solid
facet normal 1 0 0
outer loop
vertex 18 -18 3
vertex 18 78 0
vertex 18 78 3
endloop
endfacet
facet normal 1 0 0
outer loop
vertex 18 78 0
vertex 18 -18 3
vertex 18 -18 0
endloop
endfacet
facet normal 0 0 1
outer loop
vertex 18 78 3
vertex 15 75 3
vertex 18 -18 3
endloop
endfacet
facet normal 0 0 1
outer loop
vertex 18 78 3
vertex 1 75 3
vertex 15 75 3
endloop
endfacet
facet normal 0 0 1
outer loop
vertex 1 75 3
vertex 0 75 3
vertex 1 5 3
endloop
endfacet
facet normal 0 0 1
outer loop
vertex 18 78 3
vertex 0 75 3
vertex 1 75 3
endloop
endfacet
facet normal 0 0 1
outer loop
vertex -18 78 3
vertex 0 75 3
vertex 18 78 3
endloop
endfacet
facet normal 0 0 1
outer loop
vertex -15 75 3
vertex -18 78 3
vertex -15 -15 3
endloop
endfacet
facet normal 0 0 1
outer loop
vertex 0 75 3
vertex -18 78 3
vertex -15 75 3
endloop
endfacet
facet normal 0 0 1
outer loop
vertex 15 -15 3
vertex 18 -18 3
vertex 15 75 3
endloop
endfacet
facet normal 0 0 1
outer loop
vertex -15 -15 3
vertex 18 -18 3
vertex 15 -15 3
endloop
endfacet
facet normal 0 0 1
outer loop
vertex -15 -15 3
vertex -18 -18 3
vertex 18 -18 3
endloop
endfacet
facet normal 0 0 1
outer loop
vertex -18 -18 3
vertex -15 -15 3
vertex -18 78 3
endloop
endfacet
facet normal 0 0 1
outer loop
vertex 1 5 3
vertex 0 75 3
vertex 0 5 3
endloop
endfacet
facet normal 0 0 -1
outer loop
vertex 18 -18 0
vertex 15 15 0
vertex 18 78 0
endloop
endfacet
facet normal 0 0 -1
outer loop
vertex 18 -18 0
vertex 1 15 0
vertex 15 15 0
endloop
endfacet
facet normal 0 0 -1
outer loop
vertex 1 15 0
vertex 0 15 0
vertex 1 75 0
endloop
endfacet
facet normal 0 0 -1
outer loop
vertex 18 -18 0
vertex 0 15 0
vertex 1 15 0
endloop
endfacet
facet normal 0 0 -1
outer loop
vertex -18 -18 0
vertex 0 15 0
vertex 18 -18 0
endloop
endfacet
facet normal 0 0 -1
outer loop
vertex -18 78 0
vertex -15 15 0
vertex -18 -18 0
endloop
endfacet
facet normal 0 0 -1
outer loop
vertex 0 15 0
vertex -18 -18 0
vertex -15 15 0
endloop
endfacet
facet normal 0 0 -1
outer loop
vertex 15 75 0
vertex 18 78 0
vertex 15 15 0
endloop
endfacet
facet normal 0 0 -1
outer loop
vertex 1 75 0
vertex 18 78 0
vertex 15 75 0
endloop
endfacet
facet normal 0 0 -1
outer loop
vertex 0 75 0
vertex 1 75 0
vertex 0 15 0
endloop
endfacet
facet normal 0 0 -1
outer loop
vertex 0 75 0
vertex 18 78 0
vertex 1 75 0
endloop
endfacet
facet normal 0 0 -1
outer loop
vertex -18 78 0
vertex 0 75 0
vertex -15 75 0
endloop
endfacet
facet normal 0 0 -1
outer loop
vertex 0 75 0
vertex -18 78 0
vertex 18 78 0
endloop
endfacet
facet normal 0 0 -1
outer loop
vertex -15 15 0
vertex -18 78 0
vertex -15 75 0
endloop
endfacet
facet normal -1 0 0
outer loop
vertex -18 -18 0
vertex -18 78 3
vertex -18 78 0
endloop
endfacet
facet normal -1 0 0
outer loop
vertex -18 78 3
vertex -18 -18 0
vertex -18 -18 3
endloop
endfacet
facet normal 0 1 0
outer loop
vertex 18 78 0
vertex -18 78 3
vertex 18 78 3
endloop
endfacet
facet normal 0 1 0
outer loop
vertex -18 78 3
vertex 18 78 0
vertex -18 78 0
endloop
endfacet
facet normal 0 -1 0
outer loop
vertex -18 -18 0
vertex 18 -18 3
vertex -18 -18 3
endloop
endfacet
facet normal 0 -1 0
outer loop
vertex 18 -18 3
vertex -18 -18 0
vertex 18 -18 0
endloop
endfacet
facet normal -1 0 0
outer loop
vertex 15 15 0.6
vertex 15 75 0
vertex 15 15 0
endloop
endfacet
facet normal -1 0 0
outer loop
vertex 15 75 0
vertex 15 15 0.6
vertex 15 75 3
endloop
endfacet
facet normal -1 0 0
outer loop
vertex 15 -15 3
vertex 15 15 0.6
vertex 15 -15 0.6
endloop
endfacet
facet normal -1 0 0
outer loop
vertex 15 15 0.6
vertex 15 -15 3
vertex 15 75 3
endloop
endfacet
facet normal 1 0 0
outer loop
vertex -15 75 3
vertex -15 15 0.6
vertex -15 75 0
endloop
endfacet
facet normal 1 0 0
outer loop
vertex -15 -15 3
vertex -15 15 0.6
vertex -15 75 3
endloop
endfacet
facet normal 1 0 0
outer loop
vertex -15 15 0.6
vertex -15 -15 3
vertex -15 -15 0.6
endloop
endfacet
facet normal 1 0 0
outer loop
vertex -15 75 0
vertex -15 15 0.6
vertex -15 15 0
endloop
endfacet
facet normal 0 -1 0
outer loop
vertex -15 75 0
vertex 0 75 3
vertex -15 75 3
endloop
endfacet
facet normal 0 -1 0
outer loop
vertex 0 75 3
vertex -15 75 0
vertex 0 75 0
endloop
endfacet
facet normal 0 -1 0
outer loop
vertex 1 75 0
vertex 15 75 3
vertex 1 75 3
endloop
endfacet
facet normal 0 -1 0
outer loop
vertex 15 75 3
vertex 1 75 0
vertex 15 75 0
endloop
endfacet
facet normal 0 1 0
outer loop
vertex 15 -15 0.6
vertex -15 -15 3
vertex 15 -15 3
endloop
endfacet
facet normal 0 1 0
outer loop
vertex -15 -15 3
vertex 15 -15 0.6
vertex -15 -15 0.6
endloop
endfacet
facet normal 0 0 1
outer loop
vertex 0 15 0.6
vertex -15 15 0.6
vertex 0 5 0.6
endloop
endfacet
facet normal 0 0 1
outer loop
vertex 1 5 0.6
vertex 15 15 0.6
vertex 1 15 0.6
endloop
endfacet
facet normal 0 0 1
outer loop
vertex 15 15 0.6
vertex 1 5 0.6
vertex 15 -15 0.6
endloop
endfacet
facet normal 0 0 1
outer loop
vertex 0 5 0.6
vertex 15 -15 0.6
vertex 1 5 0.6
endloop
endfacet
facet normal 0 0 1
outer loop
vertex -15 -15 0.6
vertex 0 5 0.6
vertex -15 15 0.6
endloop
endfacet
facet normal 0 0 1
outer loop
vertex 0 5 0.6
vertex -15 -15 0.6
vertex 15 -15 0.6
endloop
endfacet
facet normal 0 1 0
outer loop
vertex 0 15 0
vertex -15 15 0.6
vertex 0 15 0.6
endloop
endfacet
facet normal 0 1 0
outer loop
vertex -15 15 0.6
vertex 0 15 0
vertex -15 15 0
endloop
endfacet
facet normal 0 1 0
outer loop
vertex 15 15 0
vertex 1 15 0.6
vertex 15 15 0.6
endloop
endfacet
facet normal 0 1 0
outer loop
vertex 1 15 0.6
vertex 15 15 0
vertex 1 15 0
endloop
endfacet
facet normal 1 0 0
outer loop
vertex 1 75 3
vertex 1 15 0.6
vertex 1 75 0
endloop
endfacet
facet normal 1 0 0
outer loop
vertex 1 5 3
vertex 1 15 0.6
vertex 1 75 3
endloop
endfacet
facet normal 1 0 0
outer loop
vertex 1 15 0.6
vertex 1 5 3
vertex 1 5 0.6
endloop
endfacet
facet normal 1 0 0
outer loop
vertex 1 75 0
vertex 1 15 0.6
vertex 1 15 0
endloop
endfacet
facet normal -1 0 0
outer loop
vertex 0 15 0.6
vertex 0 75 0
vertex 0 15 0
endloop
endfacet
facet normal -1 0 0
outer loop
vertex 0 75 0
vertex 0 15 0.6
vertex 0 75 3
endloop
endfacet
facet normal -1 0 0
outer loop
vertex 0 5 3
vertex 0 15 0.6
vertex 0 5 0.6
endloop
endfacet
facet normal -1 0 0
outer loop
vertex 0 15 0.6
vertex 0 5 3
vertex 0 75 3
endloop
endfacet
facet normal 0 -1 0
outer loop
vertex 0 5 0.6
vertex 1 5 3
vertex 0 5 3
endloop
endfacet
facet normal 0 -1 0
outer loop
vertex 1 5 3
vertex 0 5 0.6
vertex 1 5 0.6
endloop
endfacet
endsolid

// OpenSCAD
line_length = 60;
line_join = 10;
line_z = 2;

diaphragm_x = 30;
diaphragm_y = 30;
diaphragm_z = 0.6;

scaffold_xy = 3; // width of outer scaffold
scaffold_z = 3; // height of outer scaffold

render_eps = 0.01;

// diaphragm
translate([0, 0, diaphragm_z/2])
cube([diaphragm_x, diaphragm_y, diaphragm_z], center=true);

translate([0, line_length/2, scaffold_z/2]){
difference(){
    cube([diaphragm_x + 2 * scaffold_xy, diaphragm_y + line_length + 2 * scaffold_xy, scaffold_z], center=true);
    cube([diaphragm_x, diaphragm_y + line_length, scaffold_z + render_eps], center=true);
}
}

translate([0, diaphragm_y/2 - line_join, 0])
cube([1, line_length + line_join, scaffold_z]);
